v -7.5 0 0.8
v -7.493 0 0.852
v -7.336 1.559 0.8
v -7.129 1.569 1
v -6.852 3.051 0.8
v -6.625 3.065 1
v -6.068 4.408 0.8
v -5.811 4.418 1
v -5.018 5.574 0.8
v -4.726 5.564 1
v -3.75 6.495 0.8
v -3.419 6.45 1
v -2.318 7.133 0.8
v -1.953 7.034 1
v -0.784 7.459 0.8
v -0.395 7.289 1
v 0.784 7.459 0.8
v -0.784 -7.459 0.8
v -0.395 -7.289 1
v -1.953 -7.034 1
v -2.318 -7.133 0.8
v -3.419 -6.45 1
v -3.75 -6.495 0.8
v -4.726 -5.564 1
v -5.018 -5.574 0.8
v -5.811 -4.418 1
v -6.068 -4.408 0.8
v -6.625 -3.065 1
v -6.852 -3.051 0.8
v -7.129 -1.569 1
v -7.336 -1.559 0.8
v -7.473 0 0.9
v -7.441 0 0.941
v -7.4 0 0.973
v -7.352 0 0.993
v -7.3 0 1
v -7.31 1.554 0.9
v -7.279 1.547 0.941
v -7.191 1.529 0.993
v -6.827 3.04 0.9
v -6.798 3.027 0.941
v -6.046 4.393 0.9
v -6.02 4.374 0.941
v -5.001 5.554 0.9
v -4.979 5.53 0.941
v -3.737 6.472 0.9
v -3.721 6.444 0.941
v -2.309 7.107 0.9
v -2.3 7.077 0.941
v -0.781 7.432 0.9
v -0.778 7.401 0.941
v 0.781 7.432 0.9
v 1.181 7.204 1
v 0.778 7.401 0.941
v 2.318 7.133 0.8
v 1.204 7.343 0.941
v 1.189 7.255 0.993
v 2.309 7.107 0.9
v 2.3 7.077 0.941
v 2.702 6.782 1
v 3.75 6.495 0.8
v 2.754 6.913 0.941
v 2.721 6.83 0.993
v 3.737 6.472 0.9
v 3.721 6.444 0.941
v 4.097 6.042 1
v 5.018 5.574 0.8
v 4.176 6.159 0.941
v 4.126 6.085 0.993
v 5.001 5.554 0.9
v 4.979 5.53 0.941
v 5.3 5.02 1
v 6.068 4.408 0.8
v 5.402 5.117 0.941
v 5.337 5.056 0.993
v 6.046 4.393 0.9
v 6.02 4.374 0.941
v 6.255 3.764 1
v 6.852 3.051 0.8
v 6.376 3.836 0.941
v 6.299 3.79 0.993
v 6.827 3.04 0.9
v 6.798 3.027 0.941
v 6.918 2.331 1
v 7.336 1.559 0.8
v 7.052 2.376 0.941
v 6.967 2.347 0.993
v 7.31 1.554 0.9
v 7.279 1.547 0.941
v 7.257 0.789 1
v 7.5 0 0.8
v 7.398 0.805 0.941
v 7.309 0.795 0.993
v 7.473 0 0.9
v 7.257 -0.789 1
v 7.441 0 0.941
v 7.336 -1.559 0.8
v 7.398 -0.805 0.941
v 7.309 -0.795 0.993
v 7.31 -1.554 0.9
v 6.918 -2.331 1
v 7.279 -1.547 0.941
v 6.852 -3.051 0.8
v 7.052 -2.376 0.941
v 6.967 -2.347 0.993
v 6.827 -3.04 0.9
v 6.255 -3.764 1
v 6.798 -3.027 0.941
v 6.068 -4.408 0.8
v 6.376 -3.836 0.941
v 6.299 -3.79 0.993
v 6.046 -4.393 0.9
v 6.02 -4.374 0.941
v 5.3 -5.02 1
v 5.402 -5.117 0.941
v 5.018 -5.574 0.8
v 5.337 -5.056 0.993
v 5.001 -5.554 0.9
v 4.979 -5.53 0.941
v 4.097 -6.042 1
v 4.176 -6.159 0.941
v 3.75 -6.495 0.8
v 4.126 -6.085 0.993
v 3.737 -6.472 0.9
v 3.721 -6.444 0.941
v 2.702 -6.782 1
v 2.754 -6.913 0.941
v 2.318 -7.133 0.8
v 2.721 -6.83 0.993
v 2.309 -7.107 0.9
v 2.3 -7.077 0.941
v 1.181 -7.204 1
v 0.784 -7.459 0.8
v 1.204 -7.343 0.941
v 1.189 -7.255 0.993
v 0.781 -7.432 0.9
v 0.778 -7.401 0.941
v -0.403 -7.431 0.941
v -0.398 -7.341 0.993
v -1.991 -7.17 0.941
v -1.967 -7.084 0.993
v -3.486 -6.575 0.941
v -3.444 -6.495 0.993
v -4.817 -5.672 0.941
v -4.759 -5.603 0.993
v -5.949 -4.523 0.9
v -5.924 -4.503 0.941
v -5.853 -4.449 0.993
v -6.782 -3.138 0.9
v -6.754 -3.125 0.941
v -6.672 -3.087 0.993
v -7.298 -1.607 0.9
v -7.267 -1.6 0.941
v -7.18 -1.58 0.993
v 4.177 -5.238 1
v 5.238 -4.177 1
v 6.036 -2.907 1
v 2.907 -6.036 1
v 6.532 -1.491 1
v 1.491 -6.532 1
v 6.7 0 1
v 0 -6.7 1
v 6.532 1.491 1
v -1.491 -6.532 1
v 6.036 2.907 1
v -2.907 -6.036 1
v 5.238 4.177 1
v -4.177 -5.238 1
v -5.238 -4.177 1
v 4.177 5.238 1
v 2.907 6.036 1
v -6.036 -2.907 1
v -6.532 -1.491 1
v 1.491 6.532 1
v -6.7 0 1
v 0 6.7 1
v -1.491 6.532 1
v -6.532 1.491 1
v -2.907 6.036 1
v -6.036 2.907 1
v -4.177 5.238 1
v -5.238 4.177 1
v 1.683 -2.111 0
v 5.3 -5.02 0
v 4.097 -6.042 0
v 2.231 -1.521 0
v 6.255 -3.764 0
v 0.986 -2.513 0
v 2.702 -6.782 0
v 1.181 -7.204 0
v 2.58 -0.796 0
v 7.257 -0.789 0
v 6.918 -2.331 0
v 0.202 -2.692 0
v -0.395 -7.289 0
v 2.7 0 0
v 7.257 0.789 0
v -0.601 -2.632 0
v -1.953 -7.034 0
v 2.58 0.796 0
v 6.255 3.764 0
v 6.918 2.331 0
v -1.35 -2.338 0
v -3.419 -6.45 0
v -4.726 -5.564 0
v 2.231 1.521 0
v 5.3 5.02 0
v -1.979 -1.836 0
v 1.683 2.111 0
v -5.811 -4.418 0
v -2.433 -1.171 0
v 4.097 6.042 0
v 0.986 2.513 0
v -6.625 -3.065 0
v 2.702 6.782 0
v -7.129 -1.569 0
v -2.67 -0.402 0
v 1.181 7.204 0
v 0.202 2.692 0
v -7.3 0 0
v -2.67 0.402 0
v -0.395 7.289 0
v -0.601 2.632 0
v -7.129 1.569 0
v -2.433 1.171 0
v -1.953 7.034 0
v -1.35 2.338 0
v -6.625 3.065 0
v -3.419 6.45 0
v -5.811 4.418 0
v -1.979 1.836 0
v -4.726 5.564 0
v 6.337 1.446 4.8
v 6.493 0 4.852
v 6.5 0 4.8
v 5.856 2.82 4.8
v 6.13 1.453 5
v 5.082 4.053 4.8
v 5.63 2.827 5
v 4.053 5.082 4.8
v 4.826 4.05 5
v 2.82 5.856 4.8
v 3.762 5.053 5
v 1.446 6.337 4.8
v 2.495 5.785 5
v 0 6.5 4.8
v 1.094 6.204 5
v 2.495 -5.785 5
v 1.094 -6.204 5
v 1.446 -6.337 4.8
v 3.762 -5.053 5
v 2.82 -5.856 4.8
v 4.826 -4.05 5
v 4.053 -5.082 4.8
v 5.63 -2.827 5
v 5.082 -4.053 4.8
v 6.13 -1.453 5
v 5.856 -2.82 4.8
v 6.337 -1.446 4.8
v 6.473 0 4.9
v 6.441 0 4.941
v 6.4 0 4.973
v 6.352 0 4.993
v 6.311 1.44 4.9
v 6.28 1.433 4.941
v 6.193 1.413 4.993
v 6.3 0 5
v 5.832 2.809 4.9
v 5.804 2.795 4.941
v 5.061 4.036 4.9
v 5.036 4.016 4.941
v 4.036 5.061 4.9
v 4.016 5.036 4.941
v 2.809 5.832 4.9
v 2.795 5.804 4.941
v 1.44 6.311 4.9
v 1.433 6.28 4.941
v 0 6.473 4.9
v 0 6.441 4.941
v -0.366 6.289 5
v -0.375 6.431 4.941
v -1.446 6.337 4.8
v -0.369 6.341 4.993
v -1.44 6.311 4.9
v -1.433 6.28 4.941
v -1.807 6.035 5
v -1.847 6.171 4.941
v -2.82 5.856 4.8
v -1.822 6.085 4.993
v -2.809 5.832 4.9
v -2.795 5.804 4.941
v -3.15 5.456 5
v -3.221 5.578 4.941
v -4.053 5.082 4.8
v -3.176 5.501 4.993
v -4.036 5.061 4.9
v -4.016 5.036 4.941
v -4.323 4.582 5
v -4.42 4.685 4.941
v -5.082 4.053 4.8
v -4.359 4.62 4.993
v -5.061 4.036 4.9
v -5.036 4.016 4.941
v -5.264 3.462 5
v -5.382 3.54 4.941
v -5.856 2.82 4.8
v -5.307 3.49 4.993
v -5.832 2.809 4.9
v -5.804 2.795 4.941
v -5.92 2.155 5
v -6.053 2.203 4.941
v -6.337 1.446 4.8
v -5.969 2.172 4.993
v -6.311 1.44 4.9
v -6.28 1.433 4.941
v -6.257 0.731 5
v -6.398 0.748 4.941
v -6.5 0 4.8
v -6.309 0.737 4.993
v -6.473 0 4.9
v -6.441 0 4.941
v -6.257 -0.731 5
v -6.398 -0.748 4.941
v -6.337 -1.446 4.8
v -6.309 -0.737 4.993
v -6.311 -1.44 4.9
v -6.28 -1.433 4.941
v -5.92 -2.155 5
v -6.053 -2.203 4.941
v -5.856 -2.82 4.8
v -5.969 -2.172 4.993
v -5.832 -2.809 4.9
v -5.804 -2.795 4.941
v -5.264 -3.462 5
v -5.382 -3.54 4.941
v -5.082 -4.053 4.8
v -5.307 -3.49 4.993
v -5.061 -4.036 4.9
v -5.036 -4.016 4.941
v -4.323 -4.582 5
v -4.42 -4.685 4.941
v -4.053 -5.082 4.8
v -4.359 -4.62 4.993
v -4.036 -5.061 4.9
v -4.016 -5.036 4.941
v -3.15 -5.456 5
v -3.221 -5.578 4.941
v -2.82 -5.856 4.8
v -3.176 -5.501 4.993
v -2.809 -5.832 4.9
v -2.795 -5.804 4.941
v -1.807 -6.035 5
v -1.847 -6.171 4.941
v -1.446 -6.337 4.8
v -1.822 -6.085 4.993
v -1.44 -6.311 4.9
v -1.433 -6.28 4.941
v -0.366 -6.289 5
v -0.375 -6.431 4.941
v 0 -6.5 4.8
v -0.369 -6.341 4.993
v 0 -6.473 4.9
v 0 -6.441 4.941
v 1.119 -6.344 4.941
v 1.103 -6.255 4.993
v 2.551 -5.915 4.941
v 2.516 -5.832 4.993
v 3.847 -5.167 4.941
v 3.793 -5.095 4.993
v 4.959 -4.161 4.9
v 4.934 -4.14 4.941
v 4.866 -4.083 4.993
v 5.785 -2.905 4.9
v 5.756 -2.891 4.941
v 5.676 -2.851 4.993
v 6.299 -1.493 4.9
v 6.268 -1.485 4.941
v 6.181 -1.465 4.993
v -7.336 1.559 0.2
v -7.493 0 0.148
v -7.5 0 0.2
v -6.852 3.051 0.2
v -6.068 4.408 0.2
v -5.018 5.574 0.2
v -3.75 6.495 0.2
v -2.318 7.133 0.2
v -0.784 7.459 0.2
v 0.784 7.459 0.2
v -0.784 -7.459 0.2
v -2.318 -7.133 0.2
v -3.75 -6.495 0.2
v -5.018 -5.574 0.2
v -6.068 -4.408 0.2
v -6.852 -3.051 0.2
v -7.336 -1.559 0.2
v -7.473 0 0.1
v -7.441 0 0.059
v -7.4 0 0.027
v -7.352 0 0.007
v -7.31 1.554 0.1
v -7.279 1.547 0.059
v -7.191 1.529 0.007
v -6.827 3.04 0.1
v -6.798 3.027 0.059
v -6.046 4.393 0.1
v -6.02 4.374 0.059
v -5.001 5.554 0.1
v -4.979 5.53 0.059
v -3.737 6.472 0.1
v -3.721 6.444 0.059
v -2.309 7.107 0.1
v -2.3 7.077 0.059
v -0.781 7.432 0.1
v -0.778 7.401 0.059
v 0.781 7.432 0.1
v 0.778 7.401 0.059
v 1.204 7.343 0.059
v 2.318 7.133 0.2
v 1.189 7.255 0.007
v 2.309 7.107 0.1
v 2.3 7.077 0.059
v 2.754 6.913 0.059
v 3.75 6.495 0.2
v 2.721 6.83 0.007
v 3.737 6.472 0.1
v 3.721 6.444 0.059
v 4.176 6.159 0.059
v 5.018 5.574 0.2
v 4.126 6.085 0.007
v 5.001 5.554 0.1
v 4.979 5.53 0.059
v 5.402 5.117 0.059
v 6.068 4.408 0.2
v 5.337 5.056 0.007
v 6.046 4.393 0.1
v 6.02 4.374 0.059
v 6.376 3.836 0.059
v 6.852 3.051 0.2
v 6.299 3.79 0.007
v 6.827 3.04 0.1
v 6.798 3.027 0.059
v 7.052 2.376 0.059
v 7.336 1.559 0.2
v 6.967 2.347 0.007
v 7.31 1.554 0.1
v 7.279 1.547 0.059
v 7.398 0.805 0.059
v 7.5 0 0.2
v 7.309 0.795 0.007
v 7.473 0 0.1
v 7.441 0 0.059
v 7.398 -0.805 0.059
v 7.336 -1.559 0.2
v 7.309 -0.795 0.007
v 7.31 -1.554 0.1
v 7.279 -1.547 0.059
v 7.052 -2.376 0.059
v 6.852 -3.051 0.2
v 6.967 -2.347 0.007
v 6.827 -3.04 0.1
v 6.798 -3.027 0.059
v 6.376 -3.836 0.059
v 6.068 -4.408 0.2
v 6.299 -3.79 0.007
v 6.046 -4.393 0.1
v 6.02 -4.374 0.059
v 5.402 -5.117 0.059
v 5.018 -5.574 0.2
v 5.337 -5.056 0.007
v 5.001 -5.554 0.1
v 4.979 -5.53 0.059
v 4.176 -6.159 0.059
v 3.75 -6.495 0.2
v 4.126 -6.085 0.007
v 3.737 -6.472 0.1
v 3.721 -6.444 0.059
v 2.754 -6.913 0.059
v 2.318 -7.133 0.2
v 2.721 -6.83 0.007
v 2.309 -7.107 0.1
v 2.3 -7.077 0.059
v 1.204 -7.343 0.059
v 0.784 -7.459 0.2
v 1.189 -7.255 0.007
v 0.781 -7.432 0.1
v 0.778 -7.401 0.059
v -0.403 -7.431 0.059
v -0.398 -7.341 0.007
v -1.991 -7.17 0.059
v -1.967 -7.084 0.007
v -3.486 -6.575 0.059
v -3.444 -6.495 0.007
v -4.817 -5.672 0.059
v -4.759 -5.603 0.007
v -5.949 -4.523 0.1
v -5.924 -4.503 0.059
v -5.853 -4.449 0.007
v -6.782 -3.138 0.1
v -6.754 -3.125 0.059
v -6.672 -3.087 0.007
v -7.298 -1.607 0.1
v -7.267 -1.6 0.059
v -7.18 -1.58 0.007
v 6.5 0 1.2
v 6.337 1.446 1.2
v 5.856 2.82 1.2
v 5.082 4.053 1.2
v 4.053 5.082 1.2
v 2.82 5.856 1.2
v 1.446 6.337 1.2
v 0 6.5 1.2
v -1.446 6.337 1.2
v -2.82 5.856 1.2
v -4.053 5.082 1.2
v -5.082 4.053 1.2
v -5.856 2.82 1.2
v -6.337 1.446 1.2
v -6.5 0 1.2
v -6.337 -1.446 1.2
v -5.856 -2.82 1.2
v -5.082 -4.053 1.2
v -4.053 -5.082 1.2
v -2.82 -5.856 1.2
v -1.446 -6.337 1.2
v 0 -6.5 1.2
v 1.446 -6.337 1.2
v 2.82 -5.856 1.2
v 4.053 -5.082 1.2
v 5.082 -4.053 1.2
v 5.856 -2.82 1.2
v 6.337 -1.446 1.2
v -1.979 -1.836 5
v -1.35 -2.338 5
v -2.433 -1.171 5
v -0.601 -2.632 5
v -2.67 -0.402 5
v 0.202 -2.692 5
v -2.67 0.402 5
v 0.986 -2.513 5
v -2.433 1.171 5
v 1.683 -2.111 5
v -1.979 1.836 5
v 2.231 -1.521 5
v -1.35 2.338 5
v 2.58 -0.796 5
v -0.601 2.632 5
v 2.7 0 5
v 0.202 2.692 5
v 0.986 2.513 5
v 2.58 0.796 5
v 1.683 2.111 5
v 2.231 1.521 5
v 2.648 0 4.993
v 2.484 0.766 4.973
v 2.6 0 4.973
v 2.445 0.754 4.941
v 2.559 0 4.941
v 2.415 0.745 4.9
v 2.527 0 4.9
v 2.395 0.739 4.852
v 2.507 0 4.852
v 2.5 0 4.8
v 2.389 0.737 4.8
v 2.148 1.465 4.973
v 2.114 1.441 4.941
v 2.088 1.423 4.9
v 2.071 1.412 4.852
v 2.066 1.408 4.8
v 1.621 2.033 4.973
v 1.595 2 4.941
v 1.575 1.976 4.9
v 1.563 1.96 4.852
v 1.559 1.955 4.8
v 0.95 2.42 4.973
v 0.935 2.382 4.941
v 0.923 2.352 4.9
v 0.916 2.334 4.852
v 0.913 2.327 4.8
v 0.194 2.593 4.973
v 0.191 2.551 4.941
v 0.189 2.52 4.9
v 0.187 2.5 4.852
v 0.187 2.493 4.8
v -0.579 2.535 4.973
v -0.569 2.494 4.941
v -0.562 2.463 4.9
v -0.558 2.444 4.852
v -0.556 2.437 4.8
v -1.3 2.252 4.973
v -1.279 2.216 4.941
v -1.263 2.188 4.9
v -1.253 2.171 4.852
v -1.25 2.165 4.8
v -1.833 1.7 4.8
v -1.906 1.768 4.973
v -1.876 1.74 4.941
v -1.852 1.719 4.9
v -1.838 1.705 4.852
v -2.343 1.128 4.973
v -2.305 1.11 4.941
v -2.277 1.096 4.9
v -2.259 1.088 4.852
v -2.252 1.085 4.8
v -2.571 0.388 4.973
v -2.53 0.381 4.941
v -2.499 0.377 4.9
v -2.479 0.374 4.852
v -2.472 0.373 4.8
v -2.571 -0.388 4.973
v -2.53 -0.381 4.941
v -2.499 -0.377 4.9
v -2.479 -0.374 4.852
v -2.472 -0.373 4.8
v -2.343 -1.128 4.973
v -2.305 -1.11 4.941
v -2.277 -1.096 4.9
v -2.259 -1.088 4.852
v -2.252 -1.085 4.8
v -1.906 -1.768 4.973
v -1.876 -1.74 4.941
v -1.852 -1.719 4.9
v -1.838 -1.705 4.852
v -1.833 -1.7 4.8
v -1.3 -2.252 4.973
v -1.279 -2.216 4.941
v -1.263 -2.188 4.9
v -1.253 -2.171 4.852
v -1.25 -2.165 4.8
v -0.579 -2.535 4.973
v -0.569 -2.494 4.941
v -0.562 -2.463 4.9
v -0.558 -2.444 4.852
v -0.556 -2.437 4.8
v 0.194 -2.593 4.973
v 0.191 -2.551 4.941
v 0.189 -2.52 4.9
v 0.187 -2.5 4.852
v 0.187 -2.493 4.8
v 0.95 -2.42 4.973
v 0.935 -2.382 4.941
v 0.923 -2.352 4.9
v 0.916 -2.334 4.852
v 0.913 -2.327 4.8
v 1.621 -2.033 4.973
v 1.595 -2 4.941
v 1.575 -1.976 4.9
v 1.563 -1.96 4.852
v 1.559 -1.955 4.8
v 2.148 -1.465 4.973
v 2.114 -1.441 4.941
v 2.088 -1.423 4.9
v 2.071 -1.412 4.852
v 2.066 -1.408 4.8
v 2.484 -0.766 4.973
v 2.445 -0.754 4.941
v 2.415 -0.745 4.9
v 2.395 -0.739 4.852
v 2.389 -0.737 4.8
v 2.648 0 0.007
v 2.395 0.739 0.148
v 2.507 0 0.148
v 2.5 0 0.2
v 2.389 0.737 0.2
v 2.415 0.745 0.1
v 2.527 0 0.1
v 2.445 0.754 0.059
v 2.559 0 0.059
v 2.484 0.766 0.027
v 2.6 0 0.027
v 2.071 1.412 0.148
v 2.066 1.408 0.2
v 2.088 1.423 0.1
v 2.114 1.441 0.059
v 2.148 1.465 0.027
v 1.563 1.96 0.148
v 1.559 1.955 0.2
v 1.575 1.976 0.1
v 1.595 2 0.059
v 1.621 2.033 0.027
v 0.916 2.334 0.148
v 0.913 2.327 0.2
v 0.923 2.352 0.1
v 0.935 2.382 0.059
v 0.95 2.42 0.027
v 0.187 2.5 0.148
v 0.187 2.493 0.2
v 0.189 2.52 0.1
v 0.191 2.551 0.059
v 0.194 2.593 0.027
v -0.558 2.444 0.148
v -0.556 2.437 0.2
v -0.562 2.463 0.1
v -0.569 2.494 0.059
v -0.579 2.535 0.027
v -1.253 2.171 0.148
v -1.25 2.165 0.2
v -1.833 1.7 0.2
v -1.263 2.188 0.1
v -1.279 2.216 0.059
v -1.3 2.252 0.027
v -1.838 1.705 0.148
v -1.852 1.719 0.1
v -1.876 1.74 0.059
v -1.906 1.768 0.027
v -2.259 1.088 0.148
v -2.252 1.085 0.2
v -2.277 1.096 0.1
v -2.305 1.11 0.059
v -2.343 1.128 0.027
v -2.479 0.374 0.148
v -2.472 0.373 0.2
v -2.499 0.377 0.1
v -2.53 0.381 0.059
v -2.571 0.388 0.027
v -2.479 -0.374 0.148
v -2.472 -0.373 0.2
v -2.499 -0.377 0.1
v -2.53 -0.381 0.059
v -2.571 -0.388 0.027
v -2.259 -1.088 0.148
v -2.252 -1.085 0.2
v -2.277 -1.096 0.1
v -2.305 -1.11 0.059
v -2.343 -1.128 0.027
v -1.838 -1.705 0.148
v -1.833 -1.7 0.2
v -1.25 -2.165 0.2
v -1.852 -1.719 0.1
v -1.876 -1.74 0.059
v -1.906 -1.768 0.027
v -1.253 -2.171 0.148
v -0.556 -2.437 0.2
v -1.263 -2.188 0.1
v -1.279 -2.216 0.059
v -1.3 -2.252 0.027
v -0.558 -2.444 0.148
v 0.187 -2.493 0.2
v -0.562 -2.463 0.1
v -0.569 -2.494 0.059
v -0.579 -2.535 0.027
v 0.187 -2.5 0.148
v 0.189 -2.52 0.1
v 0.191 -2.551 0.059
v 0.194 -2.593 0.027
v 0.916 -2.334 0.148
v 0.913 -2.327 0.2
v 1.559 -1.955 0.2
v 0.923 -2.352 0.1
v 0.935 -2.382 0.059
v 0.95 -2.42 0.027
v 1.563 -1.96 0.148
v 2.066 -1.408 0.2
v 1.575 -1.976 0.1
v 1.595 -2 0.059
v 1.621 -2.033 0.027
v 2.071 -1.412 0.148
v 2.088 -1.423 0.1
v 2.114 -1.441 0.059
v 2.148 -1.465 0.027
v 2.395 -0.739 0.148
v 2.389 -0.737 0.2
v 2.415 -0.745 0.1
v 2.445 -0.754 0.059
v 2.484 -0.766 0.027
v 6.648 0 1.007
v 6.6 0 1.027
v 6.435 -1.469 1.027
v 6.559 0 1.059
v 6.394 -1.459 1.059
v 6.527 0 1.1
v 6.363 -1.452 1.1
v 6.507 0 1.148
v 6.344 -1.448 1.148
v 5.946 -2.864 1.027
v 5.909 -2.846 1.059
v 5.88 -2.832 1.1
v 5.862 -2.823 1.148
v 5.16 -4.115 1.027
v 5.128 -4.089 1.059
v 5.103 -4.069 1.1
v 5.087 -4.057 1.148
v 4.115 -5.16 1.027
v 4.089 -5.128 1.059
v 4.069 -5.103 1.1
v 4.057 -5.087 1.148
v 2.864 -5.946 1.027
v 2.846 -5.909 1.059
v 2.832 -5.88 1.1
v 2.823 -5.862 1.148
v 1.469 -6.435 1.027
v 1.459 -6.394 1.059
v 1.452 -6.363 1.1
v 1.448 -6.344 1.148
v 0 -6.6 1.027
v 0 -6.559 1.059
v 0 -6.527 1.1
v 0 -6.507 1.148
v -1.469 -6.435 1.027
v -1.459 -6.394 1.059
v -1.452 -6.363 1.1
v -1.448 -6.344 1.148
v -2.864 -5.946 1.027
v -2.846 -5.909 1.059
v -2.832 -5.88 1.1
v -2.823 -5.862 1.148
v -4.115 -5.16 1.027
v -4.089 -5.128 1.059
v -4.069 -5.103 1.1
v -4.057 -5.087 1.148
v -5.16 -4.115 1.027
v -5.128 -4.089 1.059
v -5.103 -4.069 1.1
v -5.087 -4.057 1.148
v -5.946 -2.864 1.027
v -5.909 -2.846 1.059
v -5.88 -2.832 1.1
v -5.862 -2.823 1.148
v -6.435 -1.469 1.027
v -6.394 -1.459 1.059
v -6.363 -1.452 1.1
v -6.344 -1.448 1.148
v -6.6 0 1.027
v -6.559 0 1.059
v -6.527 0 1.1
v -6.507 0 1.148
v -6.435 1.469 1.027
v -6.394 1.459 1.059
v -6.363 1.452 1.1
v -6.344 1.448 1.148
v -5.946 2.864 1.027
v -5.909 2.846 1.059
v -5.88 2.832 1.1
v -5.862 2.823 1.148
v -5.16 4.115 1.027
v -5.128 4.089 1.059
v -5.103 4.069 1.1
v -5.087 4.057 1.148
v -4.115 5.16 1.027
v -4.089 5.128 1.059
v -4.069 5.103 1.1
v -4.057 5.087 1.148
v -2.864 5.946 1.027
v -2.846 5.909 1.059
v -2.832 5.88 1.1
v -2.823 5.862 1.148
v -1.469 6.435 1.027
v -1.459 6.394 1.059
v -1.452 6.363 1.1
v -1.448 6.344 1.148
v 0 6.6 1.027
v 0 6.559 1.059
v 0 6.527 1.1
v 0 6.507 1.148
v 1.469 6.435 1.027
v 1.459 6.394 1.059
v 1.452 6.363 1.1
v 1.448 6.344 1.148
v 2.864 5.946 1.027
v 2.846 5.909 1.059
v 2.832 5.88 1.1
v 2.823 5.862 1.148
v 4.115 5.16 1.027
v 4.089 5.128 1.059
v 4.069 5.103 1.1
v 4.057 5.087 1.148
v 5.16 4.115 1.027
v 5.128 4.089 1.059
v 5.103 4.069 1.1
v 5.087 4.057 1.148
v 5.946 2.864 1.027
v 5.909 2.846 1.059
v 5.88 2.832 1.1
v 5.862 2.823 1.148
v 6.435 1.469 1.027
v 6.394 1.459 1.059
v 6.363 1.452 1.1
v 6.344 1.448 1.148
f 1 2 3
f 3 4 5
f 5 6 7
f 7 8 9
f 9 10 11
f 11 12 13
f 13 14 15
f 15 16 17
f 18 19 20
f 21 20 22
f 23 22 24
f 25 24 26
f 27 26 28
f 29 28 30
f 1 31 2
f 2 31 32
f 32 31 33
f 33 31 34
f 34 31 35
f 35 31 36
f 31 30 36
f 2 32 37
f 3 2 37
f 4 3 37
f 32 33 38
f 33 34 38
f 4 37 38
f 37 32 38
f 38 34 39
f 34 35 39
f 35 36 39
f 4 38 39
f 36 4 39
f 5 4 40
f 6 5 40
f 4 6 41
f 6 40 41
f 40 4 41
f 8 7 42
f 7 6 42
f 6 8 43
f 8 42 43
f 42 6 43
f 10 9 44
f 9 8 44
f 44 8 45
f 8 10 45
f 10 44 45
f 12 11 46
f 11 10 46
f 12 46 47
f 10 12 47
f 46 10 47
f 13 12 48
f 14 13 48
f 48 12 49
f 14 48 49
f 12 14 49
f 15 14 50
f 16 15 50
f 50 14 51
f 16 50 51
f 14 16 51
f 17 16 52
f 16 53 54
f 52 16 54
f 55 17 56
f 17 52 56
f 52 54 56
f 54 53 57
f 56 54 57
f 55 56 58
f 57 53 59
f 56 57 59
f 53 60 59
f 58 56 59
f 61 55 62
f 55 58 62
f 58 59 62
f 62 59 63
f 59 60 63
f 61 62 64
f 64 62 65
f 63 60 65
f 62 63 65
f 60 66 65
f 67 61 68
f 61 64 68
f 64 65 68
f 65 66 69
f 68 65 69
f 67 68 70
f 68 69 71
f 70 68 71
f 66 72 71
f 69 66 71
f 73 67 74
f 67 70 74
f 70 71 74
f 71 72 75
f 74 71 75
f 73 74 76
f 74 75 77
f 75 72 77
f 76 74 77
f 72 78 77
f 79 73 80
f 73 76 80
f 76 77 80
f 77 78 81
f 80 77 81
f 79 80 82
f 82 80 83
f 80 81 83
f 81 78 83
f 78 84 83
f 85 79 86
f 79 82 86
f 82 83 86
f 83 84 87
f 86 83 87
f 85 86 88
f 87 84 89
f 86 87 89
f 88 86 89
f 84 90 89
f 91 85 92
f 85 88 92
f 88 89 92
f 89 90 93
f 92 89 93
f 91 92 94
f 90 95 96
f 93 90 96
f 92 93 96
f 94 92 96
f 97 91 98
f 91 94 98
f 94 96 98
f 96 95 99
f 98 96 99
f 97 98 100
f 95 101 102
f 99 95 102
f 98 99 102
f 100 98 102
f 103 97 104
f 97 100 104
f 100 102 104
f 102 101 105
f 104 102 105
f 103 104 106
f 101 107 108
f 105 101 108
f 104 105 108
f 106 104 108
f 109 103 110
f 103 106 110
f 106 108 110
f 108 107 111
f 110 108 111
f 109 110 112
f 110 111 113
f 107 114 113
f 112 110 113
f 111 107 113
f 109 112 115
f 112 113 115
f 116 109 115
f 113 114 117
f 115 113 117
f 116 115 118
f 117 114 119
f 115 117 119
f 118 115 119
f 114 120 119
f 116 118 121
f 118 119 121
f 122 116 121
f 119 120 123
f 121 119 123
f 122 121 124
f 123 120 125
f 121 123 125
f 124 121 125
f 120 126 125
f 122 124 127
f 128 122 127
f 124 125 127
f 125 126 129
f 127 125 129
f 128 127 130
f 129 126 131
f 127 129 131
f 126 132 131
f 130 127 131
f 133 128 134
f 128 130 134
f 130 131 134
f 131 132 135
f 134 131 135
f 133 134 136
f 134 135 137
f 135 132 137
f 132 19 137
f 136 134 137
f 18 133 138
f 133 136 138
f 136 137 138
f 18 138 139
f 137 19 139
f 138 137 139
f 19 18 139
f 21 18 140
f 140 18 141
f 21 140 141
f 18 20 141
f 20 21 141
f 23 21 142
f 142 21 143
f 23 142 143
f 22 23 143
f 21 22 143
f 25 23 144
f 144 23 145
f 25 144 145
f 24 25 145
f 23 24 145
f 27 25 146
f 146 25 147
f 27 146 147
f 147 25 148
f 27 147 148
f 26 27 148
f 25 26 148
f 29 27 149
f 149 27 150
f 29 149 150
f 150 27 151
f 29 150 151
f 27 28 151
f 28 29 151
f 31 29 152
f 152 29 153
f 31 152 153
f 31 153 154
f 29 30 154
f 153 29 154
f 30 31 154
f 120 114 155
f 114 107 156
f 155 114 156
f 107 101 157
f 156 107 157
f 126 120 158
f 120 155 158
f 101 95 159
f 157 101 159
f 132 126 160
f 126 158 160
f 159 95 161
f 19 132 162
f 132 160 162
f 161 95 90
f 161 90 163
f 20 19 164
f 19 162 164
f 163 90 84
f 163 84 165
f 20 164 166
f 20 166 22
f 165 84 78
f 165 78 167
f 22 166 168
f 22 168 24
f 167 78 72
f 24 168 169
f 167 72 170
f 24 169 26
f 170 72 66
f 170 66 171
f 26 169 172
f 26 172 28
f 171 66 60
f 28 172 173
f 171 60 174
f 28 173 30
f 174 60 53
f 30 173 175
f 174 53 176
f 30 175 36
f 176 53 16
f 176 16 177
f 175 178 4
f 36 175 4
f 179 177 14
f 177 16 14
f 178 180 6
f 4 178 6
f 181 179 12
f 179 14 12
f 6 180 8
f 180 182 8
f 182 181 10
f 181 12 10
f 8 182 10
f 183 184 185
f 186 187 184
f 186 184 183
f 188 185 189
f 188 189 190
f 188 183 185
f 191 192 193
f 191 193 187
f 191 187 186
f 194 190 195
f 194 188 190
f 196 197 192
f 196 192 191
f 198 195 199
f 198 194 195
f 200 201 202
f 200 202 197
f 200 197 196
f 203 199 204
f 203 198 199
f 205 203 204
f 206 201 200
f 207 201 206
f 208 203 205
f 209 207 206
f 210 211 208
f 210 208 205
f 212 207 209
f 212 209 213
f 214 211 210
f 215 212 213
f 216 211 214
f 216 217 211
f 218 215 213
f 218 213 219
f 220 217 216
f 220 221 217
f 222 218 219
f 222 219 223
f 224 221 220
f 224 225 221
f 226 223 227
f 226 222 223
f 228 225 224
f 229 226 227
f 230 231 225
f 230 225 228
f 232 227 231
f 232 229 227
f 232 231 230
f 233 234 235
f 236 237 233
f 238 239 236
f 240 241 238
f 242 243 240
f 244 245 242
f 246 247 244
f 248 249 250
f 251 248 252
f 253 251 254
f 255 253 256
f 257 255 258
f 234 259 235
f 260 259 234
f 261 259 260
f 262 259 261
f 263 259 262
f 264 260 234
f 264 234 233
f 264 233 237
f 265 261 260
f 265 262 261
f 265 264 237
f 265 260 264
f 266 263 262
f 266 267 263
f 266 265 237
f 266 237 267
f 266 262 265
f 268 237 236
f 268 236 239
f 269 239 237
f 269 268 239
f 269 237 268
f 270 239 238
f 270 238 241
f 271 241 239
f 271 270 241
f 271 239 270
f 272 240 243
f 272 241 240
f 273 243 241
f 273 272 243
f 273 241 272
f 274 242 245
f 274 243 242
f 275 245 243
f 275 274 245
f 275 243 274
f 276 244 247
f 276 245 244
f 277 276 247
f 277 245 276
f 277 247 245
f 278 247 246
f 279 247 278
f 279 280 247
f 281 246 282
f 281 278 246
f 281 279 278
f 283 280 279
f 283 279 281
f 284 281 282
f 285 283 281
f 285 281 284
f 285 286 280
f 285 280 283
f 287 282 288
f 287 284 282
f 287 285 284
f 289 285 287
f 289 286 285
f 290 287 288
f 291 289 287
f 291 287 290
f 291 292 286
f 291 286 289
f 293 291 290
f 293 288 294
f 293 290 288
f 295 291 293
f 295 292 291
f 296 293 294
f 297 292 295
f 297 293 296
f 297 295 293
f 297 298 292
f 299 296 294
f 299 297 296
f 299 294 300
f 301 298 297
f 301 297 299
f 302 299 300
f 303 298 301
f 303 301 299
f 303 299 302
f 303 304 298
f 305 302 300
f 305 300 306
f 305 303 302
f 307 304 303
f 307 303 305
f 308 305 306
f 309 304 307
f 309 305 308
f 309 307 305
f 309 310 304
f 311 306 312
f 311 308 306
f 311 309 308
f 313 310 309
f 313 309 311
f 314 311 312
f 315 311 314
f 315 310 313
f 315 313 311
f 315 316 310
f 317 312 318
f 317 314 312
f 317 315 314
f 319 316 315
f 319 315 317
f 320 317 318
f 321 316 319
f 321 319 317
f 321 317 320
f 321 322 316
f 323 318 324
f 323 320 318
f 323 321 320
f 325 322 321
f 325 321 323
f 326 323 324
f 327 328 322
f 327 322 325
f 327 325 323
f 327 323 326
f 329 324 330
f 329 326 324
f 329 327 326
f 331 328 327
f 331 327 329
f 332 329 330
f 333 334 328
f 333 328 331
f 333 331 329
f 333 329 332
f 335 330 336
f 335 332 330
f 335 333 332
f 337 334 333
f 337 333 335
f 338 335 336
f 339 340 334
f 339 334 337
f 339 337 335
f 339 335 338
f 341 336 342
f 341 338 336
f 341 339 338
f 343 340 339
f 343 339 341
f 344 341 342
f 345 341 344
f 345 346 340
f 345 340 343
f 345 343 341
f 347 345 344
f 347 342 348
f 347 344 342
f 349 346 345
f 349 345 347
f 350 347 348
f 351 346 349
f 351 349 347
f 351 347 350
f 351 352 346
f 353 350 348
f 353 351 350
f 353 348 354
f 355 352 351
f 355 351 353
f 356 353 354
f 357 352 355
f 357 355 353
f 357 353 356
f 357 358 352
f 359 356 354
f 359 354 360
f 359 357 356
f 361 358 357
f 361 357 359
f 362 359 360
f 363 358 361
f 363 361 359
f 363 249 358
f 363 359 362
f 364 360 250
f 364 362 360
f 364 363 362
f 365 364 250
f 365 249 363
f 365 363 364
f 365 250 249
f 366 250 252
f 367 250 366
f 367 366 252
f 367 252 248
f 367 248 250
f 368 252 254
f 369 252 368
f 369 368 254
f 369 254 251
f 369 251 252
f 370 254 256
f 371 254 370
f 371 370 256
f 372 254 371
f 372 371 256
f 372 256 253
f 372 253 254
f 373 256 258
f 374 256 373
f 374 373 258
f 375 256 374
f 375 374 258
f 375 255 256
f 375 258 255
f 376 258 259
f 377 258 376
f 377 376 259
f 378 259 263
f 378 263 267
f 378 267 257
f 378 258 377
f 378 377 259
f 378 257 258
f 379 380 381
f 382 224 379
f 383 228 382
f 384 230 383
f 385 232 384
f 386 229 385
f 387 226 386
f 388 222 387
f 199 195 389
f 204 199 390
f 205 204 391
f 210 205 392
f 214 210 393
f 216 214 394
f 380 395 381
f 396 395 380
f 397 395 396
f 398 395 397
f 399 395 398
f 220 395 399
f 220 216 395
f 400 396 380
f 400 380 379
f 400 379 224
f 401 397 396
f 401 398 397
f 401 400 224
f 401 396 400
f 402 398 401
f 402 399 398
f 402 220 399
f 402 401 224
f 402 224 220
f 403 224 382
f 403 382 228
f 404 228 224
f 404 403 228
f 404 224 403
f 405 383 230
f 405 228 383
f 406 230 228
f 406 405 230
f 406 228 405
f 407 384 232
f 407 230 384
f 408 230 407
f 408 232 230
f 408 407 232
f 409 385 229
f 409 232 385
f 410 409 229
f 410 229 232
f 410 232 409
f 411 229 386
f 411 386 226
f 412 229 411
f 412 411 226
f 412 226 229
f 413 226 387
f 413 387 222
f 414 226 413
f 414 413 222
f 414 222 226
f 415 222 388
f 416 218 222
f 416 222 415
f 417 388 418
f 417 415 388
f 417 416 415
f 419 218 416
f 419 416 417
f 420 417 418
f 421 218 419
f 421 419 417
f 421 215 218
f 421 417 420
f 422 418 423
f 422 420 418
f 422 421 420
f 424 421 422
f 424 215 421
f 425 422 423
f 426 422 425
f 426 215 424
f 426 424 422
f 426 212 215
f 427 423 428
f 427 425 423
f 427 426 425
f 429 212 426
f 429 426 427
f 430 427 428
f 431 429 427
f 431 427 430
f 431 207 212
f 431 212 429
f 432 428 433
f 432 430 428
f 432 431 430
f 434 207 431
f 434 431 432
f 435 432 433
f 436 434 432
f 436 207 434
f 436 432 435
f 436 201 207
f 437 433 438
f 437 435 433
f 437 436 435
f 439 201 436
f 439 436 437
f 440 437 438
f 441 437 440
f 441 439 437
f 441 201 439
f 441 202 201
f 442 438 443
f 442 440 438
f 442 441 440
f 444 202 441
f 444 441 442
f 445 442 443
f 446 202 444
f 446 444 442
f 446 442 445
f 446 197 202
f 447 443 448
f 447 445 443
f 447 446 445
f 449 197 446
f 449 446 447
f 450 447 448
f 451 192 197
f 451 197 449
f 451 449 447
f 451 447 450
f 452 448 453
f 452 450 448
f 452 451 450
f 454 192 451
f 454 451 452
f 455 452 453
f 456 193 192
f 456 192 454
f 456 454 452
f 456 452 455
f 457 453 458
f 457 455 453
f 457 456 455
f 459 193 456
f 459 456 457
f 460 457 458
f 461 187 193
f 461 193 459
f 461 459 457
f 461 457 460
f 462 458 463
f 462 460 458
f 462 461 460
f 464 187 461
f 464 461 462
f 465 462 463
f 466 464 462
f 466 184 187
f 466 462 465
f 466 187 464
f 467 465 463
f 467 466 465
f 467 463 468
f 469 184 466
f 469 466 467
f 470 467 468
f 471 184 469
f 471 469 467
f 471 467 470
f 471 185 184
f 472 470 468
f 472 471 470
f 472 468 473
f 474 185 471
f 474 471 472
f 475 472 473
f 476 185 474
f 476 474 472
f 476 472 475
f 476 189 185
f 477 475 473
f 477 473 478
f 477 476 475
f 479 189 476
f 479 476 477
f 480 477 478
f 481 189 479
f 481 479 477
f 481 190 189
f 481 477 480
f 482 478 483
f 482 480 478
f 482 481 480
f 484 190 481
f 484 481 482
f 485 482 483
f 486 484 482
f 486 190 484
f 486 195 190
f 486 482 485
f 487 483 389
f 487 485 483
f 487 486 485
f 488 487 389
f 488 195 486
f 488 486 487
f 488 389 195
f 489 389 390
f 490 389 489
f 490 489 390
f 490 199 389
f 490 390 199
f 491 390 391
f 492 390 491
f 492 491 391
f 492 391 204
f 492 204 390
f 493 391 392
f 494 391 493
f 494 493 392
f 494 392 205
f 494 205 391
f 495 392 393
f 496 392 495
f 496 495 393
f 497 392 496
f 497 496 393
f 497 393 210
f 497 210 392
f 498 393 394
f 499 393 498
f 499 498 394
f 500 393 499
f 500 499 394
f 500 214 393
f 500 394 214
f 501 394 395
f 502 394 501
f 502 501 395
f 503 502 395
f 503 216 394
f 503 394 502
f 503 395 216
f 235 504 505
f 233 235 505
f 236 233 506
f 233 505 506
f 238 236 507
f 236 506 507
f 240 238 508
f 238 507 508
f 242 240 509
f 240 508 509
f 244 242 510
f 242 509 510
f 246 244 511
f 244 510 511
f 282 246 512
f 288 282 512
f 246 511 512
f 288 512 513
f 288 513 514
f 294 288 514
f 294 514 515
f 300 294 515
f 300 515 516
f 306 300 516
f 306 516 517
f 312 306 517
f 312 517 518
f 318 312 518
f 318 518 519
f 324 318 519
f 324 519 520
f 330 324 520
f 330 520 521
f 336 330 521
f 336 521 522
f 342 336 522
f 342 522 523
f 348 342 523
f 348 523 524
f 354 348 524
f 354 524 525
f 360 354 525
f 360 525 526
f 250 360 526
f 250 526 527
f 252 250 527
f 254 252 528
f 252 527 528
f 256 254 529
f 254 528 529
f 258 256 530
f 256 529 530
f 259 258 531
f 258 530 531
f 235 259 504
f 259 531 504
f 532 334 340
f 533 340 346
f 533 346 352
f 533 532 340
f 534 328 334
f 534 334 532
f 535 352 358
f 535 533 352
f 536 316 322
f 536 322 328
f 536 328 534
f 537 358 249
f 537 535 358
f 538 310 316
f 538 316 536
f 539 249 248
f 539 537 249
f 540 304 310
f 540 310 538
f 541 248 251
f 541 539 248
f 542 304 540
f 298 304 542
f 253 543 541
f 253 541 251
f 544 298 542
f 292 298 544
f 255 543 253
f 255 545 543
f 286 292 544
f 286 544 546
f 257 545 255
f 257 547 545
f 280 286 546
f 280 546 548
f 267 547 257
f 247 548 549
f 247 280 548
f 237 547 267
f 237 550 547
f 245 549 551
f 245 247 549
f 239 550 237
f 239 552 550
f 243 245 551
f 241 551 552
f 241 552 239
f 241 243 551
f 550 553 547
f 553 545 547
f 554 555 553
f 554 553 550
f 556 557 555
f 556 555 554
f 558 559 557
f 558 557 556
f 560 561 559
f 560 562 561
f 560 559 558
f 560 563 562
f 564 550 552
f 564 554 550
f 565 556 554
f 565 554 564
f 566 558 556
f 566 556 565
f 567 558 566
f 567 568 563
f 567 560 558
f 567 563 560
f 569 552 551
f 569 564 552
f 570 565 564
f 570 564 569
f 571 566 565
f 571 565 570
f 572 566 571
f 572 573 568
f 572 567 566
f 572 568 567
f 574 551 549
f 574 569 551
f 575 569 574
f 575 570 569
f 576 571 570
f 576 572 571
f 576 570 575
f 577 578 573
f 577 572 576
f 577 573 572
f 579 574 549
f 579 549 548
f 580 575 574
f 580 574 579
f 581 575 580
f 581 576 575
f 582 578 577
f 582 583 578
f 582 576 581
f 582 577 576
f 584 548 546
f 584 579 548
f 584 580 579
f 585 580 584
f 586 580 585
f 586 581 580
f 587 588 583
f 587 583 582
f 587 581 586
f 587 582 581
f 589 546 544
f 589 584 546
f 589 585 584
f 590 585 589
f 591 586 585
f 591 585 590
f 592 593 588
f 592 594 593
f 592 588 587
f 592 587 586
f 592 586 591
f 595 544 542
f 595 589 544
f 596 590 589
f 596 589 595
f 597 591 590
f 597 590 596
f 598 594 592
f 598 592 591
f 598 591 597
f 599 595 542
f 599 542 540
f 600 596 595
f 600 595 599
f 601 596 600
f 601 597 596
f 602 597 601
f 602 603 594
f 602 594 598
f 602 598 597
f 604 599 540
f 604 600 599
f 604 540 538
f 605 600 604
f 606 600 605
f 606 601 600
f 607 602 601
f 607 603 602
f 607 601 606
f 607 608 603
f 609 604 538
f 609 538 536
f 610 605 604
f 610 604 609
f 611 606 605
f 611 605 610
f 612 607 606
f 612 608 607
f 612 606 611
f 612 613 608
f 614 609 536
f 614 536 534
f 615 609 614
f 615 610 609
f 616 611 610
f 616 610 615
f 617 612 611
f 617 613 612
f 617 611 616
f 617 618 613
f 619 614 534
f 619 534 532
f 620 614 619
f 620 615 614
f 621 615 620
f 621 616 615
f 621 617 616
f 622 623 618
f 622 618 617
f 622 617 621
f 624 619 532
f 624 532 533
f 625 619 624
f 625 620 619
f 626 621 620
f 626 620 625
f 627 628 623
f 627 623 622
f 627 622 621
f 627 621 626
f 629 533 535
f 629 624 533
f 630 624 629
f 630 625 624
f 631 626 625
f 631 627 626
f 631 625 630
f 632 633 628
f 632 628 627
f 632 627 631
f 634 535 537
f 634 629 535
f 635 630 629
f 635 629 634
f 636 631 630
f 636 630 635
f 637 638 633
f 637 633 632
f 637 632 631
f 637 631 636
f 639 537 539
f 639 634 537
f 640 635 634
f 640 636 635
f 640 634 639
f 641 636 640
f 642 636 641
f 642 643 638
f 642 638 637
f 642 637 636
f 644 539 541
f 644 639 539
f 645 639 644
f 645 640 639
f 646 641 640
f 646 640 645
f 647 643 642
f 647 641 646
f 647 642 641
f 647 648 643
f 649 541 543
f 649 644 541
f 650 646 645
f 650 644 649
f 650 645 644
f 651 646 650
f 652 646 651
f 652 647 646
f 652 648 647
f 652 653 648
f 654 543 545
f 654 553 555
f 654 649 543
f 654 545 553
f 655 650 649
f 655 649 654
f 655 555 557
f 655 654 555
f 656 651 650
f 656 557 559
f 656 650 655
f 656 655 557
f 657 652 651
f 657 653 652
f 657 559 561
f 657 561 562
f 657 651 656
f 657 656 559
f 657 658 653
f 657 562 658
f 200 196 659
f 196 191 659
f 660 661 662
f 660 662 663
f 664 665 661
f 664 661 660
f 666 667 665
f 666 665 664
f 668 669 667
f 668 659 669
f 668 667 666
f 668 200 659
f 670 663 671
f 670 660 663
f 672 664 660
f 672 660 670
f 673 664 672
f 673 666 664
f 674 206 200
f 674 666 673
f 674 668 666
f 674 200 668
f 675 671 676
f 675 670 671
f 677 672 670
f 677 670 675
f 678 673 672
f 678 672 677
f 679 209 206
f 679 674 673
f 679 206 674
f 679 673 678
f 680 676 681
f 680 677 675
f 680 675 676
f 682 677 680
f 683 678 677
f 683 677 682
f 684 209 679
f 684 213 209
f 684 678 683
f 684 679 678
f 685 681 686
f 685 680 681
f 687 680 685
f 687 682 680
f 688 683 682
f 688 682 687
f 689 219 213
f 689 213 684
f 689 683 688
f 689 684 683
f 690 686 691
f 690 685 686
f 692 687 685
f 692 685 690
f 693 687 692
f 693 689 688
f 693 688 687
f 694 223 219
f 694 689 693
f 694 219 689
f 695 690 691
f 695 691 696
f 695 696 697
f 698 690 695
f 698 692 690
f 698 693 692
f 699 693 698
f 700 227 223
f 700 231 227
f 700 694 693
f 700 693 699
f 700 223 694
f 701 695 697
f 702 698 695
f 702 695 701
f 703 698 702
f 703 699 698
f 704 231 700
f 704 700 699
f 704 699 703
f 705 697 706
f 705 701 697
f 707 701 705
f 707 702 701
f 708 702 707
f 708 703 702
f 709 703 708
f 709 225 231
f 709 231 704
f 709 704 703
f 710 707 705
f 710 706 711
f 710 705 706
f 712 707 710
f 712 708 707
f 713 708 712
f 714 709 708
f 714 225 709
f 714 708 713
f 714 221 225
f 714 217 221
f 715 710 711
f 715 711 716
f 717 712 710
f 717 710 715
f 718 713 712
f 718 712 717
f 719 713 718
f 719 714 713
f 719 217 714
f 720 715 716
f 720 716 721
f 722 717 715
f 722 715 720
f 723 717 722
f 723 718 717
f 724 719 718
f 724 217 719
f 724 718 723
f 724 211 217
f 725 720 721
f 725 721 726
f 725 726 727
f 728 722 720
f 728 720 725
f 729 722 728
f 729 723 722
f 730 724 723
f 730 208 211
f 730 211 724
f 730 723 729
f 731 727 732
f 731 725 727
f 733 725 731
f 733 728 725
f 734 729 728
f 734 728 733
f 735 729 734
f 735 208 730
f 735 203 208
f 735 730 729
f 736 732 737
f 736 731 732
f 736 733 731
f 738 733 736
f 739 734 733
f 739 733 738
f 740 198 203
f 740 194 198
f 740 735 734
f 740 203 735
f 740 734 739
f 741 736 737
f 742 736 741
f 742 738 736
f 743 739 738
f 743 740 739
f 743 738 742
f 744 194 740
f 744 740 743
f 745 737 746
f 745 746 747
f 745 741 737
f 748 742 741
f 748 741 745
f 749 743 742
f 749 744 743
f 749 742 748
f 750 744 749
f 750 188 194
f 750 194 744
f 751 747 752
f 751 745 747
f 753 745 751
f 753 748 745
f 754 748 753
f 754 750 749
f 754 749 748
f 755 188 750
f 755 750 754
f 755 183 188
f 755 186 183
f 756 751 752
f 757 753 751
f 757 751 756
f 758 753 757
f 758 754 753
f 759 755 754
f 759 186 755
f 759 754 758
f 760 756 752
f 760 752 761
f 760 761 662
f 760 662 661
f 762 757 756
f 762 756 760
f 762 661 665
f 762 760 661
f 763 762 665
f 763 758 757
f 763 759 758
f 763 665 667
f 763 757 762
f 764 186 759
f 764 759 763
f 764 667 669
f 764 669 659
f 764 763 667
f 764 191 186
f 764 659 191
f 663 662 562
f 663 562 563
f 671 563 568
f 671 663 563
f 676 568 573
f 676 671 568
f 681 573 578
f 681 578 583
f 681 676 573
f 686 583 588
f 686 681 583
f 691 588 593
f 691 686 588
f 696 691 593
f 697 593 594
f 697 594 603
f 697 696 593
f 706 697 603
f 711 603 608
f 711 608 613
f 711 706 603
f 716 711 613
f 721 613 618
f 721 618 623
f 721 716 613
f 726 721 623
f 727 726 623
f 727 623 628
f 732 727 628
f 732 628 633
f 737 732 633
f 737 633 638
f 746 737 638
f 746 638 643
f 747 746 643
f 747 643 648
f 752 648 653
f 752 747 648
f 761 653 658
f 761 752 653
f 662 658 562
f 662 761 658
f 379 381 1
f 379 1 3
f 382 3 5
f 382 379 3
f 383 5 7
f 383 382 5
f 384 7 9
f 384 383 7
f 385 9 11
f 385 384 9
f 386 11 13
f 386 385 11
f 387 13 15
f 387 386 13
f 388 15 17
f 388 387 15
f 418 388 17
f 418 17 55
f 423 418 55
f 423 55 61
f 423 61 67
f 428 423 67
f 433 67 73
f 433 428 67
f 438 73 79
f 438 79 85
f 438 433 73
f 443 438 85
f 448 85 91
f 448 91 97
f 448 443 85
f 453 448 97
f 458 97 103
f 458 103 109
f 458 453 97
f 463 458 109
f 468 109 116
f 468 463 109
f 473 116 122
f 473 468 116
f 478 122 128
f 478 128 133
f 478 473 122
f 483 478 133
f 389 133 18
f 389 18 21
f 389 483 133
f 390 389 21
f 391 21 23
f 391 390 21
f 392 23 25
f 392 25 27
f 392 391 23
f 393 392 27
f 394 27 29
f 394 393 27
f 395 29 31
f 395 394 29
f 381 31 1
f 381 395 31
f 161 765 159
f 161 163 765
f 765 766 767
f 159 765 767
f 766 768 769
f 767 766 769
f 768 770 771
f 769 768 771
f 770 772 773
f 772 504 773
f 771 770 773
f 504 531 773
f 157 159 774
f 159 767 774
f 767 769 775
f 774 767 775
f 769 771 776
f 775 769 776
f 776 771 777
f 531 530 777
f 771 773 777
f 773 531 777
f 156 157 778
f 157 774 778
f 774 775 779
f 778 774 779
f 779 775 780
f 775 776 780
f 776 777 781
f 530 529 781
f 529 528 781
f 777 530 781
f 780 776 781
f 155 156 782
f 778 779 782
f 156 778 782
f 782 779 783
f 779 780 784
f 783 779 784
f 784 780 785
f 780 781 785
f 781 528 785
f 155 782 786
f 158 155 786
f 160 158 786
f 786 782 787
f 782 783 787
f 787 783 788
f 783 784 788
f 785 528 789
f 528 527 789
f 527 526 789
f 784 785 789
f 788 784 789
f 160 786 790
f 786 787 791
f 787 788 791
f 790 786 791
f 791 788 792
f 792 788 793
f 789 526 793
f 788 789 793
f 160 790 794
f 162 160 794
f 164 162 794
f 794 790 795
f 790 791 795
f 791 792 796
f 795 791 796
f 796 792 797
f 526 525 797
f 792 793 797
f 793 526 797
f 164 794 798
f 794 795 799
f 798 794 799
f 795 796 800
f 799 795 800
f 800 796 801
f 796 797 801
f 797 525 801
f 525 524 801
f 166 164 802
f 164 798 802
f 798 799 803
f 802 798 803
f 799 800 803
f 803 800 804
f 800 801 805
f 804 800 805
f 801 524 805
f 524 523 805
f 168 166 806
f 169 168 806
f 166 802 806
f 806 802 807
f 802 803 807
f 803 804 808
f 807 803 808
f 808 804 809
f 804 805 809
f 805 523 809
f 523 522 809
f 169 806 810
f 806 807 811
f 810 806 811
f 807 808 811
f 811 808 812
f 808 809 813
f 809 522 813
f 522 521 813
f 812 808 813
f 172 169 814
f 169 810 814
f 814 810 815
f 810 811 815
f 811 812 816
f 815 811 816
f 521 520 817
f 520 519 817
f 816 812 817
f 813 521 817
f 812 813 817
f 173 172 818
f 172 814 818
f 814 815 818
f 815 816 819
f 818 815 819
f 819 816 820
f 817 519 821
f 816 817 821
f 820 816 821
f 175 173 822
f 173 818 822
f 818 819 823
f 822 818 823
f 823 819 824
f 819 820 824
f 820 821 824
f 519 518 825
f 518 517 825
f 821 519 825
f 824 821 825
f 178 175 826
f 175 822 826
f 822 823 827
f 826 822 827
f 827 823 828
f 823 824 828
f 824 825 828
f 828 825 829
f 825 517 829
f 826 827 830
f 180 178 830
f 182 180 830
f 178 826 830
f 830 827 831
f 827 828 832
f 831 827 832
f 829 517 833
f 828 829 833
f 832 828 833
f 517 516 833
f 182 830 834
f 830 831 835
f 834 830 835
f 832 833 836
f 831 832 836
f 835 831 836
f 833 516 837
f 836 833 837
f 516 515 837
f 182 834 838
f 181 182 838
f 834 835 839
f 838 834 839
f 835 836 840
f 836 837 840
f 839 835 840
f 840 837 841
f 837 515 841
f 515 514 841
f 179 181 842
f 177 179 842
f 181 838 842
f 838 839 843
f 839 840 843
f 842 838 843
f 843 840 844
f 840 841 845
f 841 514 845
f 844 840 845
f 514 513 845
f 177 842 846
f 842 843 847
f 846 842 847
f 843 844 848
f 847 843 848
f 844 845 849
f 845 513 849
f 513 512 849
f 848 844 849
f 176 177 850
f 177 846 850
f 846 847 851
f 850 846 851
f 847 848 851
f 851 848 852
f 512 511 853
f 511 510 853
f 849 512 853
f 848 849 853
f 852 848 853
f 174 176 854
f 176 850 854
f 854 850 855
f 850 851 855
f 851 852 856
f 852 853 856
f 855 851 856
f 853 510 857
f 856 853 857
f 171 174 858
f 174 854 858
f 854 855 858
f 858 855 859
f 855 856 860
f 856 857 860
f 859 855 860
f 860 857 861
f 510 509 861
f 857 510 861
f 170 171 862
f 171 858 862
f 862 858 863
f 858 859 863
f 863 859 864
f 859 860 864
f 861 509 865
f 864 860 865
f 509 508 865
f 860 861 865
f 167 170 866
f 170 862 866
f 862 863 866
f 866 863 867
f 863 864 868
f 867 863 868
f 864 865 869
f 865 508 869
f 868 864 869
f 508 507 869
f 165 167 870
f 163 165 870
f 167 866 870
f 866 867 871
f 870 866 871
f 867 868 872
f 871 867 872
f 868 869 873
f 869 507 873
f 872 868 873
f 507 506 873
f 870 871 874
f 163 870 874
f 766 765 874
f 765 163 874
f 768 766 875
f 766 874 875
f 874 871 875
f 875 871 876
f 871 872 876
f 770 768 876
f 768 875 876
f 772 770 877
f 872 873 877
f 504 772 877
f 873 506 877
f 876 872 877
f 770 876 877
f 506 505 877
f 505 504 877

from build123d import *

# Parameters (mm, degrees)
SKETCH_1_R      = 6.5
SKETCH_1_R_2    = 2.5
EXTRUDE_1_DEPTH = 5
SKETCH_2_R      = 7.5
SKETCH_2_R_2    = 2.5
EXTRUDE_2_DEPTH = 1
FILLET_1_R      = 0.2


with BuildPart() as part:
    # 草图1 → 凸台-拉伸1 (new body)
    with BuildSketch(Plane.XY):
        Circle(SKETCH_1_R)
        Circle(SKETCH_1_R_2, mode=Mode.SUBTRACT)
    extrude(amount=EXTRUDE_1_DEPTH)

    # 草图2 → 凸台-拉伸2 (add)
    with BuildSketch(Plane(origin=(0, 0, 0), x_dir=(-1, 0, 0), z_dir=(0, 0, -1))):
        Circle(SKETCH_2_R)
        Circle(SKETCH_2_R_2, mode=Mode.SUBTRACT)
    extrude(amount=-EXTRUDE_2_DEPTH)

    # 圆角1
    fillet_1_edges = [part.edges().sort_by_distance(p)[0] for p in [
        (7.5, 0, 0),
        (7.5, 0, 1),
        (-6.5, 0, 5),
        (-2.5, 0, 0),
        (-2.5, 0, 5),
        (-6.5, 0, 1),
    ]]
    fillet(fillet_1_edges, radius=FILLET_1_R)


solid = part.part
